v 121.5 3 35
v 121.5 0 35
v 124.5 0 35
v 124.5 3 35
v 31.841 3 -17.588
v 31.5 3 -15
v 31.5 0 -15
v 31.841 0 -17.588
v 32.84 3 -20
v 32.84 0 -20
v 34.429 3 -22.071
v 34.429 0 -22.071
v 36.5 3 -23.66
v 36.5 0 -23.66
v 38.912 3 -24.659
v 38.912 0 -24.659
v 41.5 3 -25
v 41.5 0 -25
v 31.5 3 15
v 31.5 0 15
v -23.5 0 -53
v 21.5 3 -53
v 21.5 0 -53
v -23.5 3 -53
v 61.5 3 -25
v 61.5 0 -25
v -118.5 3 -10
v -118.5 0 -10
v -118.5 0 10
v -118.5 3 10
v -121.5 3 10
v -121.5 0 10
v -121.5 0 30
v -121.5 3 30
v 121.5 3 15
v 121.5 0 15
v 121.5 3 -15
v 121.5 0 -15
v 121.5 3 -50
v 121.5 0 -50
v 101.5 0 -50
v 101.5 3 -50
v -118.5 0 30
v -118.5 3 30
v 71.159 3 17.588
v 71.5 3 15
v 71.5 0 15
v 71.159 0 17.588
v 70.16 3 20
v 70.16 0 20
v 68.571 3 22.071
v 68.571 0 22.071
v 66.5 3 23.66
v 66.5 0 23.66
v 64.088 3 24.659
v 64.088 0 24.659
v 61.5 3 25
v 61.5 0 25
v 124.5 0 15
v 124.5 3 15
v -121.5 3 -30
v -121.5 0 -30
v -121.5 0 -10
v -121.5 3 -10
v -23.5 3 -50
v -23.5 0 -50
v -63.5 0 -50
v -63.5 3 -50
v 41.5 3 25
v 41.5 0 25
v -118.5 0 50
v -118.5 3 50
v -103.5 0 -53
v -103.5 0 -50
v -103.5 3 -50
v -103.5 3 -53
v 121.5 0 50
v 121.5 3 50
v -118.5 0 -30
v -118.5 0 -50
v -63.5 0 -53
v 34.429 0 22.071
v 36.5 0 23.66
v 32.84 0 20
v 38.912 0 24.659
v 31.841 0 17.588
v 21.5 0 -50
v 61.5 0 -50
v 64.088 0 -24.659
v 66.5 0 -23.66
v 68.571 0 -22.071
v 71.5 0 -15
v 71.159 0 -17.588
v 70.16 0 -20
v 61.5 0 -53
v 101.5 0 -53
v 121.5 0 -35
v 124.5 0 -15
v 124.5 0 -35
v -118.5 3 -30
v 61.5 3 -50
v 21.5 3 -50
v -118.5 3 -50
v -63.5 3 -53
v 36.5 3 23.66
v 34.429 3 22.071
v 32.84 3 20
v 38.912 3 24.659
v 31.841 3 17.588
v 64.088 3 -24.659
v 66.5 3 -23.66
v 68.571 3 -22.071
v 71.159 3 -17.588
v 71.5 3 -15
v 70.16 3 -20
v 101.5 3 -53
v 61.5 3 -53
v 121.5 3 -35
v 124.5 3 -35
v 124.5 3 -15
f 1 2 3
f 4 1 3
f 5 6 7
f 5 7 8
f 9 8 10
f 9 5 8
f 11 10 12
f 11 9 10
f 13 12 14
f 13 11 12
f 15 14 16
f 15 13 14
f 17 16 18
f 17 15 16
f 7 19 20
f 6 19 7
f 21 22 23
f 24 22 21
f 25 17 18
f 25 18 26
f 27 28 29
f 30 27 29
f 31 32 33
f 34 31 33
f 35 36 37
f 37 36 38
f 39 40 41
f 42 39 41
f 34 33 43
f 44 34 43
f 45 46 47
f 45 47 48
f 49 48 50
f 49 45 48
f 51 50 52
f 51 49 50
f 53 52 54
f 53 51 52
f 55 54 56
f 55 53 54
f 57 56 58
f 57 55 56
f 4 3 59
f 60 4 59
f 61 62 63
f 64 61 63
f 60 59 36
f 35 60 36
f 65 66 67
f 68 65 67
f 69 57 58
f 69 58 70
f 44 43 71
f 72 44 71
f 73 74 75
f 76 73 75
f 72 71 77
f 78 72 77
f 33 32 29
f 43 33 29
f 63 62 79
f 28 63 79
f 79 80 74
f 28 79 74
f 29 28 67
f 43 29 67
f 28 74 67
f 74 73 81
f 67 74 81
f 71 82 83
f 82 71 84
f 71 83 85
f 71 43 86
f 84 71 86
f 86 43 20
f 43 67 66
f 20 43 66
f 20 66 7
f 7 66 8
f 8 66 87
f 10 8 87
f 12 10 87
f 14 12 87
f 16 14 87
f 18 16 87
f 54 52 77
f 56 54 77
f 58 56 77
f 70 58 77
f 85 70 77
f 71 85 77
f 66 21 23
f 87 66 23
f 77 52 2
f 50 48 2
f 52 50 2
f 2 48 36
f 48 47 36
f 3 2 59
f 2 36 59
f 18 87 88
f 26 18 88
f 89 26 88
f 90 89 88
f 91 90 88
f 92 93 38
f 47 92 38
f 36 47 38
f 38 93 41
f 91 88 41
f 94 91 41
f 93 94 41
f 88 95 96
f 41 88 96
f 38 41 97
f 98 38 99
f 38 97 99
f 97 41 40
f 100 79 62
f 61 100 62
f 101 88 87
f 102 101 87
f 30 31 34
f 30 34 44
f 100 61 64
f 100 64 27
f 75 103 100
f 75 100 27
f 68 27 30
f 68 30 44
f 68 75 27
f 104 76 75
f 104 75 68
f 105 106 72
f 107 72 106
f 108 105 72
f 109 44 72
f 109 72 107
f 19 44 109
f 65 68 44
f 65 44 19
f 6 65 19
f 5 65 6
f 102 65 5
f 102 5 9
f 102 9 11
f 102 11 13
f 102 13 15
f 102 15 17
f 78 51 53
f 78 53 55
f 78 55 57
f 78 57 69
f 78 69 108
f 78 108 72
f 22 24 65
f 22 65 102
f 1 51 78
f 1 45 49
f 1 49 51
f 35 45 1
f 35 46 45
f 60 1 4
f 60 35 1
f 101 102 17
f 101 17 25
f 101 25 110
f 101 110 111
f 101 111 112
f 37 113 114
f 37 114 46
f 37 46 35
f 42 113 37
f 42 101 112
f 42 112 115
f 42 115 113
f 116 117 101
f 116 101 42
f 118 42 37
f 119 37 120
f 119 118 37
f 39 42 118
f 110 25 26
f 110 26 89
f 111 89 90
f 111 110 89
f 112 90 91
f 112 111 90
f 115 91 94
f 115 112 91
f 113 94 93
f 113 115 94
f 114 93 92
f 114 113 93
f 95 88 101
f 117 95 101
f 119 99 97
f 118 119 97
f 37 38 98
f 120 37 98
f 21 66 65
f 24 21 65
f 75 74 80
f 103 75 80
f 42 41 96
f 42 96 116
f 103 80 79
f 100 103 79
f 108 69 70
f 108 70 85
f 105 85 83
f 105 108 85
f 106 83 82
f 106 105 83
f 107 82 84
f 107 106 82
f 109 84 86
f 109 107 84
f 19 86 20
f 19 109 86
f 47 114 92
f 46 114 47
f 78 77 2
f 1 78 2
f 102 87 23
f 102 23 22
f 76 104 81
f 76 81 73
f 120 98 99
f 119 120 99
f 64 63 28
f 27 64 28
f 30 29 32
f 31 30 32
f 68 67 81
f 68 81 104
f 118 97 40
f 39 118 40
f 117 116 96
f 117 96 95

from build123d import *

# Parameters (mm, degrees)
BOSS_EXTRUDE1_DEPTH = 3
SKETCH2_W           = 40
SKETCH2_H           = 3
SKETCH2_W_2         = 45
BOSS_EXTRUDE2_DEPTH = 3
CUT_EXTRUDE1_DEPTH  = 3


with BuildPart() as part:
    # Sketch1 → Boss-Extrude1 (new body)
    with BuildSketch(Plane(origin=(0, 0, 0), x_dir=(1, 0, 0), z_dir=(0, 1, 0))):
        Polygon((-118.5, -30), (-118.5, -50), (121.5, -50), (121.5, -35), (124.5, -35), (124.5, -15), (121.5, -15), (121.5, 15), (124.5, 15), (124.5, 35), (121.5, 35), (121.5, 50), (-118.5, 50), (-118.5, 30), (-121.5, 30), (-121.5, 10), (-118.5, 10), (-118.5, -10), (-121.5, -10), (-121.5, -30), align=None)
    extrude(amount=BOSS_EXTRUDE1_DEPTH)

    # Sketch2 → Boss-Extrude2 (add)
    with BuildSketch(Plane(origin=(0, 0, -50), x_dir=(-1, 0, 0), z_dir=(0, 0, -1))):
        with Locations((-81.5, 1.5)):
            Rectangle(SKETCH2_W, SKETCH2_H)
        with Locations((1, 1.5)):
            Rectangle(SKETCH2_W_2, SKETCH2_H)
        with Locations((83.5, 1.5)):
            Rectangle(SKETCH2_W, SKETCH2_H)
    extrude(amount=BOSS_EXTRUDE2_DEPTH)

    # Sketch3 → Cut-Extrude1 (cut)
    with BuildSketch(Plane(origin=(0, 3, 0), x_dir=(1, 0, 0), z_dir=(0, 1, 0))):
        with BuildLine():
            Line((41.5, 25), (61.5, 25))
            ThreePointArc((61.5, 25), (68.571067812, 22.071067812), (71.5, 15))
            Line((71.5, 15), (71.5, -15))
            ThreePointArc((71.5, -15), (68.571067812, -22.071067812), (61.5, -25))
            Line((61.5, -25), (41.5, -25))
            ThreePointArc((41.5, -25), (34.428932188, -22.071067812), (31.5, -15))
            Line((31.5, -15), (31.5, 15))
            ThreePointArc((31.5, 15), (34.428932188, 22.071067812), (41.5, 25))
        make_face()
    extrude(amount=-CUT_EXTRUDE1_DEPTH, mode=Mode.SUBTRACT)


solid = part.part
